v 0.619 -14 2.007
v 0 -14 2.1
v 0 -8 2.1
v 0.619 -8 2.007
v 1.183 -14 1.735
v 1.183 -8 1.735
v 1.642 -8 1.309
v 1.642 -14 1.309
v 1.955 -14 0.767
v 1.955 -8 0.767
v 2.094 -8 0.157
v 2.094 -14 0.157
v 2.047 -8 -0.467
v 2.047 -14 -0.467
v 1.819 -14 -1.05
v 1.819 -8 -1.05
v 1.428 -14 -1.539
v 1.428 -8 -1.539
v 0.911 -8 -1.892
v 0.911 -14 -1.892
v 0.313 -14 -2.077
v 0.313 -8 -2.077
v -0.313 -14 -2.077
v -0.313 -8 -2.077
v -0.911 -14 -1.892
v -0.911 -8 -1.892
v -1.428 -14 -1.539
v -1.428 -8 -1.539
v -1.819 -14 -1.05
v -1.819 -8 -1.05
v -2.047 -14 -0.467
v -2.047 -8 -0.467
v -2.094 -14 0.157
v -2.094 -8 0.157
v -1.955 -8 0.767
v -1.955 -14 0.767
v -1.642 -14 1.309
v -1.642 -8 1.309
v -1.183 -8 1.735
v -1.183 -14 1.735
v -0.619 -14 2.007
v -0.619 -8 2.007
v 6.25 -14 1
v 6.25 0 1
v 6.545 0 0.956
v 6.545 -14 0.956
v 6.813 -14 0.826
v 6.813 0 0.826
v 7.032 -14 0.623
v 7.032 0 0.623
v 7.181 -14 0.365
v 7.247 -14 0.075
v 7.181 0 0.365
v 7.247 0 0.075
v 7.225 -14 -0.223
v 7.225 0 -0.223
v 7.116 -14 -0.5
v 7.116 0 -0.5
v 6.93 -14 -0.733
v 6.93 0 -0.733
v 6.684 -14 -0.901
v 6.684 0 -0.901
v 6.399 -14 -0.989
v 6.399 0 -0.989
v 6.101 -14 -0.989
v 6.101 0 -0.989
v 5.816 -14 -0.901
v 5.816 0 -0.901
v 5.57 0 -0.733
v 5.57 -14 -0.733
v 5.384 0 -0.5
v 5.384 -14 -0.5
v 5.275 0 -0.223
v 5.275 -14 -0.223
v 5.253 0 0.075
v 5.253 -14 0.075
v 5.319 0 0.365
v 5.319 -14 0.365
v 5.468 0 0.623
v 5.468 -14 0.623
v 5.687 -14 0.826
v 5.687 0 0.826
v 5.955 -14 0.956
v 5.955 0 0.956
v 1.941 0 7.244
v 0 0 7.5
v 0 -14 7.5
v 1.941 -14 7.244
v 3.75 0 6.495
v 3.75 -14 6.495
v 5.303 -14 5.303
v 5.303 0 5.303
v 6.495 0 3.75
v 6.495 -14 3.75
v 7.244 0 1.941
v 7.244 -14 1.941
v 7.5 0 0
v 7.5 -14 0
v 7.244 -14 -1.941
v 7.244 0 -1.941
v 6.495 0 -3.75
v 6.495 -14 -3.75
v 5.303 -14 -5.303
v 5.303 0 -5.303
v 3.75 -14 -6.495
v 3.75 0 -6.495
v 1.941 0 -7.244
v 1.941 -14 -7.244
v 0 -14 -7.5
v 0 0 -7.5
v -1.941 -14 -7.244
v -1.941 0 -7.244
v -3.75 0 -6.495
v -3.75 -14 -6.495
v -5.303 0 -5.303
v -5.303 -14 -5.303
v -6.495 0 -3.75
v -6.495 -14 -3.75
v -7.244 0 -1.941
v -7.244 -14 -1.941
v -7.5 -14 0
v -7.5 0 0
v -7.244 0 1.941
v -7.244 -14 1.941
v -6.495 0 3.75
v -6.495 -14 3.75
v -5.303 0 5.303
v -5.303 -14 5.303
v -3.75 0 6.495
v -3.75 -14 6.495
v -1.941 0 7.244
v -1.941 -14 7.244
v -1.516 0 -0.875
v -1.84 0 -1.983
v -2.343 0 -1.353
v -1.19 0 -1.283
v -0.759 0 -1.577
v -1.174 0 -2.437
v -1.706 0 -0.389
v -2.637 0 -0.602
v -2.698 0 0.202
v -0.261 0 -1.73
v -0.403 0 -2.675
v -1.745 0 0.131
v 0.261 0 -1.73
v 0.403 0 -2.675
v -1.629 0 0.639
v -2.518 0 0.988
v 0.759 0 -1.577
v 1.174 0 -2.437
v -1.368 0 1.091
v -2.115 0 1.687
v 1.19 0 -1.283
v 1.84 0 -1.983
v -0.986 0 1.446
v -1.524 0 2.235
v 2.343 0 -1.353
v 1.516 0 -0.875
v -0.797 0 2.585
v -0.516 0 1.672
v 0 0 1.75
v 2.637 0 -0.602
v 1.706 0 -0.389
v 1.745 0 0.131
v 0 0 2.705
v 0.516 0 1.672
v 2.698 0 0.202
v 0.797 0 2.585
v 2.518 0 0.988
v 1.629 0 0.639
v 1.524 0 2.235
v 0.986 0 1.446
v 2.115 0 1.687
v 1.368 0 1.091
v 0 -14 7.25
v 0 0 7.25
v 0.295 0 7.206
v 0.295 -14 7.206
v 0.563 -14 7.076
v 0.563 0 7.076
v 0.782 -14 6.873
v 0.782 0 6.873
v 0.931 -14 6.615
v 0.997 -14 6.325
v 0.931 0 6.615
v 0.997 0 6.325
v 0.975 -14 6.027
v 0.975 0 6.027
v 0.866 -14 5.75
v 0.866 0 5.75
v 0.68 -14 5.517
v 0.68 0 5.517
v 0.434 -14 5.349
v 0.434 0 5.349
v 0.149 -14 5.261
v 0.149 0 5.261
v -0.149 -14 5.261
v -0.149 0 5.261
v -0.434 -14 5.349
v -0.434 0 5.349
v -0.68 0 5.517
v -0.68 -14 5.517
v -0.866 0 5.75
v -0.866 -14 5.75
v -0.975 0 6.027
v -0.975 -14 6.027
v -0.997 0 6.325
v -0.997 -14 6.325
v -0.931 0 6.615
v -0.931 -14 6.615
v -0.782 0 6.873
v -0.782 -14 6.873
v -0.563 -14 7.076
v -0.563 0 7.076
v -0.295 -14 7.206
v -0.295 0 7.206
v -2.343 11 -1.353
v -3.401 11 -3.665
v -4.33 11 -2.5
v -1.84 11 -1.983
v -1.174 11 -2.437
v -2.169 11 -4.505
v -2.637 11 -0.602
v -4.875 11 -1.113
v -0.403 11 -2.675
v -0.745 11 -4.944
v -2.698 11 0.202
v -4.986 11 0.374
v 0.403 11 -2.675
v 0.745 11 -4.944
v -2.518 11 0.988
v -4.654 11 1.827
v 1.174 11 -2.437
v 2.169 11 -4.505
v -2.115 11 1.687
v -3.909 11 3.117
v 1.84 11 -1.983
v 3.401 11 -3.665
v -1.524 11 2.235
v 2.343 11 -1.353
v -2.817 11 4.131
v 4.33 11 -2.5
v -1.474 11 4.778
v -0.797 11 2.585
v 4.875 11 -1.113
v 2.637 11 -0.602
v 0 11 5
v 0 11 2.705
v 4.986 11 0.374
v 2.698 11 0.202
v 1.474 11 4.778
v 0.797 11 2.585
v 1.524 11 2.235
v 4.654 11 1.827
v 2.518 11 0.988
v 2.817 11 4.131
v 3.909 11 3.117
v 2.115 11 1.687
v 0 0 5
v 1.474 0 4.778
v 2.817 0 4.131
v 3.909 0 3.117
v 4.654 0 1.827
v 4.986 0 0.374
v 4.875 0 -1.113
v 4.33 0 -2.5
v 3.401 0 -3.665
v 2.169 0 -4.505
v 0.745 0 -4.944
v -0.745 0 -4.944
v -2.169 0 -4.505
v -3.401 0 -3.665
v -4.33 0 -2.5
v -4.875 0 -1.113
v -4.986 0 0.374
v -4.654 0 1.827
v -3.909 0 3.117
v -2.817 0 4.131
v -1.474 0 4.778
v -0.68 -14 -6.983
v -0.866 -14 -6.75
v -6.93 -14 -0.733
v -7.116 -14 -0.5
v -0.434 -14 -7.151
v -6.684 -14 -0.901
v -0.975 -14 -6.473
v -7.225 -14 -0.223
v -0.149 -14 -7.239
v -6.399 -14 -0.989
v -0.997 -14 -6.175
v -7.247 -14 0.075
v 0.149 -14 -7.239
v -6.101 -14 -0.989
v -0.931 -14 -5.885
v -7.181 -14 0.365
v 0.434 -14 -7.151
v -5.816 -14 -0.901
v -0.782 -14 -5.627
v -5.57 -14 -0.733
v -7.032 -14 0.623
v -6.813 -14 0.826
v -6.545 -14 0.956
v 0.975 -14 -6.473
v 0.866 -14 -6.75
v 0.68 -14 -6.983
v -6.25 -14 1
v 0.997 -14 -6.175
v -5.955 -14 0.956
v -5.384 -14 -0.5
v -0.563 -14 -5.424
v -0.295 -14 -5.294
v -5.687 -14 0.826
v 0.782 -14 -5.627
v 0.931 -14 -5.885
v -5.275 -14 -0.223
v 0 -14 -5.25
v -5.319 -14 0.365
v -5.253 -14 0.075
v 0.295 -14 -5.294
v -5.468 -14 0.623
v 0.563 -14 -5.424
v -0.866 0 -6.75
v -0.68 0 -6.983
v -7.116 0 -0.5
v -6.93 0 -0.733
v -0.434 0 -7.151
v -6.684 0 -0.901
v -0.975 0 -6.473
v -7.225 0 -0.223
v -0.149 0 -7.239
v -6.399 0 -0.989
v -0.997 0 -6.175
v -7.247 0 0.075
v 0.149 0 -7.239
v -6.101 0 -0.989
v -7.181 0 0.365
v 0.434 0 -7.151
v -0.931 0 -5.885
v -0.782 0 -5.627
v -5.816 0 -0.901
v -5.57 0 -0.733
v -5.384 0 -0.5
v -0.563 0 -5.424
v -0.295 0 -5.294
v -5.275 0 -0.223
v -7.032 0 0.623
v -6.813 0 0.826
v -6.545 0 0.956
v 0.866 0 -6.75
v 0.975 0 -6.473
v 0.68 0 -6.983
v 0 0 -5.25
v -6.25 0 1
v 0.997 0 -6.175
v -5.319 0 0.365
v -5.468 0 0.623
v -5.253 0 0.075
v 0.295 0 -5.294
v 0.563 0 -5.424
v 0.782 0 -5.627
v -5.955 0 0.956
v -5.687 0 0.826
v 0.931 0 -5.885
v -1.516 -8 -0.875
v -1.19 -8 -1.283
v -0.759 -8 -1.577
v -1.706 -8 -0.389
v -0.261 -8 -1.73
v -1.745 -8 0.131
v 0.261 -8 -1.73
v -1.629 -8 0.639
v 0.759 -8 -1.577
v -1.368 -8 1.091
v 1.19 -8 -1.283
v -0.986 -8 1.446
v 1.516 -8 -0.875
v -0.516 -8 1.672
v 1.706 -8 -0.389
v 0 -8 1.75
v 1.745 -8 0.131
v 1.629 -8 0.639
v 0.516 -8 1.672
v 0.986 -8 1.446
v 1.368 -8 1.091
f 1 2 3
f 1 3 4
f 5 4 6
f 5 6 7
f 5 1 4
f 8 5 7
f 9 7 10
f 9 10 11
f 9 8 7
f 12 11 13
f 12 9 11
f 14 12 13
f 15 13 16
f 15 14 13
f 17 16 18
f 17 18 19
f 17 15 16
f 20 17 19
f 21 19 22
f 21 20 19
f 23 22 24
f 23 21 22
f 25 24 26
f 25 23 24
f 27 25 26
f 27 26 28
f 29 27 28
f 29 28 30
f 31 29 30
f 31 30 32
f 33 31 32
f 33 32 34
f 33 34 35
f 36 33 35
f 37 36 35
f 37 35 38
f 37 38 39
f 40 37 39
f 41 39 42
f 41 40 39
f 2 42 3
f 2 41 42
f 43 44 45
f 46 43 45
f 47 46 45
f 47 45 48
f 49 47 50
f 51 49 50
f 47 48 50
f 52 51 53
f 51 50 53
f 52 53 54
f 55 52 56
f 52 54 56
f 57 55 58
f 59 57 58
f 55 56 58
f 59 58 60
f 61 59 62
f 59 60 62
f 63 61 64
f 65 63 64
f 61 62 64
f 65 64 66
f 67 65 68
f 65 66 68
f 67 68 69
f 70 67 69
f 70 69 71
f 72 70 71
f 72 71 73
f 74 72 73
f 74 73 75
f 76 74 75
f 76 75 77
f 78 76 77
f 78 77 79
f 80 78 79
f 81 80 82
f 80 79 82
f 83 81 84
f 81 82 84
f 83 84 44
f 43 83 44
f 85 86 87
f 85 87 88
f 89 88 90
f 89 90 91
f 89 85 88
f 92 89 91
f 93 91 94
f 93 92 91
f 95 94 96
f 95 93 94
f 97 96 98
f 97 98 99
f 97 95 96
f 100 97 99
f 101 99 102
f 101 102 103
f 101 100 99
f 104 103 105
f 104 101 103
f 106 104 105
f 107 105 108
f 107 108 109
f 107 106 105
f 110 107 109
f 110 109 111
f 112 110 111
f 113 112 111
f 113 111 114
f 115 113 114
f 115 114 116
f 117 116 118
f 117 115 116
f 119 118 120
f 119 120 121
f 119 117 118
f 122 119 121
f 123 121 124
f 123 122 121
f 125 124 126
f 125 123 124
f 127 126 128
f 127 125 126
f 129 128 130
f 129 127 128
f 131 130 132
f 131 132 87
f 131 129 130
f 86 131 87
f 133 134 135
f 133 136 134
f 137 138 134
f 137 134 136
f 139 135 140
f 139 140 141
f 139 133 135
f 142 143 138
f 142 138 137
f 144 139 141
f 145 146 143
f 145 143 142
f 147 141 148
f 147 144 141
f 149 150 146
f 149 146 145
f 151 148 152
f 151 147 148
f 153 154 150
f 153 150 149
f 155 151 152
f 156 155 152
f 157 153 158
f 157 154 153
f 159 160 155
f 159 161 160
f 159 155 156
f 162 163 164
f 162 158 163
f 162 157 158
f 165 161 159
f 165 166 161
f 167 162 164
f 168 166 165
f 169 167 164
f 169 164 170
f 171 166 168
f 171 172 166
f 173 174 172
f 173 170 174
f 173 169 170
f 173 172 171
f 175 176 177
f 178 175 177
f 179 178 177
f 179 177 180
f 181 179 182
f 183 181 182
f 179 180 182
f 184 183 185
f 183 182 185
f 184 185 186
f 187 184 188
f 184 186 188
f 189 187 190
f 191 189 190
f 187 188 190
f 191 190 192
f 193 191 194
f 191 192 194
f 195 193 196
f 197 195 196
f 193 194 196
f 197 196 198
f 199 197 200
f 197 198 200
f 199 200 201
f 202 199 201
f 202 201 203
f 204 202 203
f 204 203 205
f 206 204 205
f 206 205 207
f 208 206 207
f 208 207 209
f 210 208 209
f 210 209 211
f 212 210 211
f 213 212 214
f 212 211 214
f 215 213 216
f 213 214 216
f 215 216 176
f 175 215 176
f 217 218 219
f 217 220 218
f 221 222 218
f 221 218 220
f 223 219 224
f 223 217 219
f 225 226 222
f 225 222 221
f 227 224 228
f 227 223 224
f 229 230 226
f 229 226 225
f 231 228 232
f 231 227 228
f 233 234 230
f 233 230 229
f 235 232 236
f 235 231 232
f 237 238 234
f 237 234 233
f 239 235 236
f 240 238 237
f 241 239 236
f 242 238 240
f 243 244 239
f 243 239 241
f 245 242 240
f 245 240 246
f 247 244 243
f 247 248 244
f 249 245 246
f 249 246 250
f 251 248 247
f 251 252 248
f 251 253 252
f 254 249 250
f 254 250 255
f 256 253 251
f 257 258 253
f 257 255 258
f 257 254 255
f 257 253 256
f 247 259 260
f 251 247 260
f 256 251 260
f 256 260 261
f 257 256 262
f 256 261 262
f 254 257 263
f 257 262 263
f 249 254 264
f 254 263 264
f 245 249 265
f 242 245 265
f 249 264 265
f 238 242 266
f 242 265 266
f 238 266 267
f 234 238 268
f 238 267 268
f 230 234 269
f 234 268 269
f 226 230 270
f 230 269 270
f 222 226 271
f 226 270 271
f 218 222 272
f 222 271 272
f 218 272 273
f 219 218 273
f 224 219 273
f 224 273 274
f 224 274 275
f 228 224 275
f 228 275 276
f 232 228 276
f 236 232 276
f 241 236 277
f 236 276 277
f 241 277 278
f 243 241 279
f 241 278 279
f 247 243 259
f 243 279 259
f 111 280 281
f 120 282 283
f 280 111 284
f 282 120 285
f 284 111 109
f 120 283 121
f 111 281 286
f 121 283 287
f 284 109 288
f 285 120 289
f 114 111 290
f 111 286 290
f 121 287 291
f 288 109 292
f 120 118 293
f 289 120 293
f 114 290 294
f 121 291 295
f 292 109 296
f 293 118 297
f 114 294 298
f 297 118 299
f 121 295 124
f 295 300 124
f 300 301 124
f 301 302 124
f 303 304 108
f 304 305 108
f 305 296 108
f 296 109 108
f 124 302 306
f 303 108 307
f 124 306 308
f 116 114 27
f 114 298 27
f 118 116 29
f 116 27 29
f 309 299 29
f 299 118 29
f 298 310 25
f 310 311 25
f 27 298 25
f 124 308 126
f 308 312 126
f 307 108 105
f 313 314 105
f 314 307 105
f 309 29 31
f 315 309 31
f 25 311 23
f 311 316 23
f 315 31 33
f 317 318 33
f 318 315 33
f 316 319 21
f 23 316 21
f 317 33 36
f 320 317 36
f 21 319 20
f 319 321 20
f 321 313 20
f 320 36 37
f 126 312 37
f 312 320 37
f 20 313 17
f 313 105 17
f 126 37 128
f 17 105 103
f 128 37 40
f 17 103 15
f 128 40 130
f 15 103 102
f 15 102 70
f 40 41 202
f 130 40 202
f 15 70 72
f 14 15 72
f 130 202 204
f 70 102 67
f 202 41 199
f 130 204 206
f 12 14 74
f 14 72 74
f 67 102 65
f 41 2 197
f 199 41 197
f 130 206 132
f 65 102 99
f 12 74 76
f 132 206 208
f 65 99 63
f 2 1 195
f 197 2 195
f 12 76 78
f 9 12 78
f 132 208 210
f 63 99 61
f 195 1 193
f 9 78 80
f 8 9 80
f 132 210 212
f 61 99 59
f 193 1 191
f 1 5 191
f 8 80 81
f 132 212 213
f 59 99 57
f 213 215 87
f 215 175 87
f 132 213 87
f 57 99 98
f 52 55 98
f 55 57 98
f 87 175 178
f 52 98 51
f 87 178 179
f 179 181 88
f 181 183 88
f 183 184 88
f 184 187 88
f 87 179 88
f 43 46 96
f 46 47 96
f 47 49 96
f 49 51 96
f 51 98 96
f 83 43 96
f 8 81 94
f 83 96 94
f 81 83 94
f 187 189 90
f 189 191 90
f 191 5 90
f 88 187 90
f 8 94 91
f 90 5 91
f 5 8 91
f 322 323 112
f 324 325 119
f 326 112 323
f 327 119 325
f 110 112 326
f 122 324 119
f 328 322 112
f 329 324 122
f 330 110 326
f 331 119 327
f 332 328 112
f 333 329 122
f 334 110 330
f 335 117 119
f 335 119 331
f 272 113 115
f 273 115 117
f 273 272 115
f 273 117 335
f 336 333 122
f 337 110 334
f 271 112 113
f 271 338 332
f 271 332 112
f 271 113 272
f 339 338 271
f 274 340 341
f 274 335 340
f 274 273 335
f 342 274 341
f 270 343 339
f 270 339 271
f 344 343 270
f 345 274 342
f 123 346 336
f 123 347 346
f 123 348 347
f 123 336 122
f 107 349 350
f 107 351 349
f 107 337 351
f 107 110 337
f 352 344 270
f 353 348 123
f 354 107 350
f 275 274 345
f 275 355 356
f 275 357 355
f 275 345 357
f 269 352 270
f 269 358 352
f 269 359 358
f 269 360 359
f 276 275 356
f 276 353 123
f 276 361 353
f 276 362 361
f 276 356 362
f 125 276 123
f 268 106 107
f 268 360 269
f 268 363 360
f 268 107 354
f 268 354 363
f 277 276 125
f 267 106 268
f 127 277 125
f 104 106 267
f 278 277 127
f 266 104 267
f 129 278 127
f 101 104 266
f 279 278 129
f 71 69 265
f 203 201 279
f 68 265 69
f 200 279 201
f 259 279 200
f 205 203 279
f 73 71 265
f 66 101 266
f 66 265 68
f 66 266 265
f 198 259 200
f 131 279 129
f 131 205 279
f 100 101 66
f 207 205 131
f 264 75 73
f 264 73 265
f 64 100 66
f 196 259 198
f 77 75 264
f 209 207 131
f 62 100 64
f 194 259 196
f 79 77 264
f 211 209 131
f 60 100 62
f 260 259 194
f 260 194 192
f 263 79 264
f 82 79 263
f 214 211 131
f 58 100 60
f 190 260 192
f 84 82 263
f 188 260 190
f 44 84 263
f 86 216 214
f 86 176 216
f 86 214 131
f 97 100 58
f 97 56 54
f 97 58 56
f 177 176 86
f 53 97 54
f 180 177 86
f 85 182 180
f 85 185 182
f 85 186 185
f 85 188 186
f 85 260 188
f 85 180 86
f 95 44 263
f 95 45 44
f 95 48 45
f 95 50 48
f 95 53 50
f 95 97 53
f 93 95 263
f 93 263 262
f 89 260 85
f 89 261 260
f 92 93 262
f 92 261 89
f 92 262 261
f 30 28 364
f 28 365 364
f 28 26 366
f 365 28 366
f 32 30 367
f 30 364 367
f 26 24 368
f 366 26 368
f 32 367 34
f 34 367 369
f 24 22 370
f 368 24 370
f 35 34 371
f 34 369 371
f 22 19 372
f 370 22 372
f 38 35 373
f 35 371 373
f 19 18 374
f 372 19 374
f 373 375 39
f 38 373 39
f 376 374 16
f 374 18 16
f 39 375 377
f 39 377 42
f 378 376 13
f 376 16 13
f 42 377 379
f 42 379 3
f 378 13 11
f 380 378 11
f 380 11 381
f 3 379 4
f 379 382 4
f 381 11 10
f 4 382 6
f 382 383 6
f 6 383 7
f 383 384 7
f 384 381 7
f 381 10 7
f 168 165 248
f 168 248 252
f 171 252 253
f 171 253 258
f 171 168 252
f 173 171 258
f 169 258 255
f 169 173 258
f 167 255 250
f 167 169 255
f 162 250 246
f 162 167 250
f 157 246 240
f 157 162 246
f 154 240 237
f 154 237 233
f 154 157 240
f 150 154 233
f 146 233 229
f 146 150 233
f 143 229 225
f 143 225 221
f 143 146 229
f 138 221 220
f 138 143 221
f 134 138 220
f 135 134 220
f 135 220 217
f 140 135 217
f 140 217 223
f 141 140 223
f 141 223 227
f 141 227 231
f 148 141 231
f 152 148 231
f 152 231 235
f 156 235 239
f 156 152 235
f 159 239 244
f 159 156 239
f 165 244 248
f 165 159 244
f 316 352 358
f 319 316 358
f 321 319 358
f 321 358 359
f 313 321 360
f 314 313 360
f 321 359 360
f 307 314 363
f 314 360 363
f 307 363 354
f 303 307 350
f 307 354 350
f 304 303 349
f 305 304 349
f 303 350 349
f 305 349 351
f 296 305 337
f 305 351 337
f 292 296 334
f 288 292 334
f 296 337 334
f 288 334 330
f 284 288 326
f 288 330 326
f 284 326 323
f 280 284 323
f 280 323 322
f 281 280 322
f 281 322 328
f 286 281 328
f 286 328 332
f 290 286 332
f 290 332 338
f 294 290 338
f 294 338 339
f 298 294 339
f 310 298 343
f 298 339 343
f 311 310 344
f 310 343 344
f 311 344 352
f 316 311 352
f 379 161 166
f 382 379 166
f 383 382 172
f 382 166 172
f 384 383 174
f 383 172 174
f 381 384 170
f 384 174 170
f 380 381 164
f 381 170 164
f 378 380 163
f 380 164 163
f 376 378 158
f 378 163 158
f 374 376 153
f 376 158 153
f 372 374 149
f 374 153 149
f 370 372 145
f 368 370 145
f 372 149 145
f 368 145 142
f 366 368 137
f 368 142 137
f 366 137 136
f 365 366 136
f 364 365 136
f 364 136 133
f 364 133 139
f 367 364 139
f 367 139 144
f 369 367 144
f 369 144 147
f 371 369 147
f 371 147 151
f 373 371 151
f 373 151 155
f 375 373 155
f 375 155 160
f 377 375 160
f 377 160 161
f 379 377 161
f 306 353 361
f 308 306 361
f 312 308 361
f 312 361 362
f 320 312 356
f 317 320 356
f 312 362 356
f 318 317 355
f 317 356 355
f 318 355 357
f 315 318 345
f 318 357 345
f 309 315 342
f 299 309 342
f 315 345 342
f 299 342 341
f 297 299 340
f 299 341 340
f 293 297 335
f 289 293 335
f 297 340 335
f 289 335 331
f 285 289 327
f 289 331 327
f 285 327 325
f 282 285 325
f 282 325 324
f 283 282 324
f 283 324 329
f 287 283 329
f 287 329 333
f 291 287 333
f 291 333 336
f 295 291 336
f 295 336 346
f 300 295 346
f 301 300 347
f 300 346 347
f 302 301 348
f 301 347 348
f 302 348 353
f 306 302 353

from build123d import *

# Parameters (mm, degrees)
SKETCH1_R           = 5
SKETCH1_R_2         = 2.7051
BOSS_EXTRUDE1_DEPTH = 11
SKETCH2_R           = 7.5
SKETCH2_R_2         = 1.75
SKETCH2_R_3         = 1
BOSS_EXTRUDE2_DEPTH = 14
CUT_EXTRUDE1_START  = -14
SKETCH3_R           = 2.1
CUT_EXTRUDE1_DEPTH  = 6


with BuildPart() as part:
    # Sketch1 → Boss-Extrude1 (new body)
    with BuildSketch(Plane(origin=(0, 0, 0), x_dir=(1, 0, 0), z_dir=(0, 1, 0))):
        with Locations(Location((0, 0, 0), (0, 0, 270))):
            Circle(SKETCH1_R)
        with Locations(Location((0, 0, 0), (0, 0, 270))):
            Circle(SKETCH1_R_2, mode=Mode.SUBTRACT)
    extrude(amount=BOSS_EXTRUDE1_DEPTH)

    # Sketch2 → Boss-Extrude2 (add)
    with BuildSketch(Plane(origin=(0, 0, 0), x_dir=(1, 0, 0), z_dir=(0, 1, 0))):
        with Locations(Location((0, 0, 0), (0, 0, 270))):
            Circle(SKETCH2_R)
        with Locations(Location((0, 0, 0), (0, 0, 270))):
            Circle(SKETCH2_R_2, mode=Mode.SUBTRACT)
        with Locations(Location((0, 6.25, 0), (0, 0, 270))):
            Circle(SKETCH2_R_3, mode=Mode.SUBTRACT)
        with Locations(Location((6.25, 0, 0), (0, 0, 270))):
            Circle(SKETCH2_R_3, mode=Mode.SUBTRACT)
        with Locations(Location((0, -6.25, 0), (0, 0, 270))):
            Circle(SKETCH2_R_3, mode=Mode.SUBTRACT)
        with Locations(Location((-6.25, 0, 0), (0, 0, 270))):
            Circle(SKETCH2_R_3, mode=Mode.SUBTRACT)
    extrude(amount=-BOSS_EXTRUDE2_DEPTH)

    # Sketch3 → Cut-Extrude1 (cut)
    with BuildSketch(Plane(origin=(0, 0, 0), x_dir=(1, 0, 0), z_dir=(0, 1, 0)).offset(CUT_EXTRUDE1_START)):
        with Locations(Location((0, 0, 0), (0, 0, 270))):
            Circle(SKETCH3_R)
    extrude(amount=CUT_EXTRUDE1_DEPTH, mode=Mode.SUBTRACT)


solid = part.part
